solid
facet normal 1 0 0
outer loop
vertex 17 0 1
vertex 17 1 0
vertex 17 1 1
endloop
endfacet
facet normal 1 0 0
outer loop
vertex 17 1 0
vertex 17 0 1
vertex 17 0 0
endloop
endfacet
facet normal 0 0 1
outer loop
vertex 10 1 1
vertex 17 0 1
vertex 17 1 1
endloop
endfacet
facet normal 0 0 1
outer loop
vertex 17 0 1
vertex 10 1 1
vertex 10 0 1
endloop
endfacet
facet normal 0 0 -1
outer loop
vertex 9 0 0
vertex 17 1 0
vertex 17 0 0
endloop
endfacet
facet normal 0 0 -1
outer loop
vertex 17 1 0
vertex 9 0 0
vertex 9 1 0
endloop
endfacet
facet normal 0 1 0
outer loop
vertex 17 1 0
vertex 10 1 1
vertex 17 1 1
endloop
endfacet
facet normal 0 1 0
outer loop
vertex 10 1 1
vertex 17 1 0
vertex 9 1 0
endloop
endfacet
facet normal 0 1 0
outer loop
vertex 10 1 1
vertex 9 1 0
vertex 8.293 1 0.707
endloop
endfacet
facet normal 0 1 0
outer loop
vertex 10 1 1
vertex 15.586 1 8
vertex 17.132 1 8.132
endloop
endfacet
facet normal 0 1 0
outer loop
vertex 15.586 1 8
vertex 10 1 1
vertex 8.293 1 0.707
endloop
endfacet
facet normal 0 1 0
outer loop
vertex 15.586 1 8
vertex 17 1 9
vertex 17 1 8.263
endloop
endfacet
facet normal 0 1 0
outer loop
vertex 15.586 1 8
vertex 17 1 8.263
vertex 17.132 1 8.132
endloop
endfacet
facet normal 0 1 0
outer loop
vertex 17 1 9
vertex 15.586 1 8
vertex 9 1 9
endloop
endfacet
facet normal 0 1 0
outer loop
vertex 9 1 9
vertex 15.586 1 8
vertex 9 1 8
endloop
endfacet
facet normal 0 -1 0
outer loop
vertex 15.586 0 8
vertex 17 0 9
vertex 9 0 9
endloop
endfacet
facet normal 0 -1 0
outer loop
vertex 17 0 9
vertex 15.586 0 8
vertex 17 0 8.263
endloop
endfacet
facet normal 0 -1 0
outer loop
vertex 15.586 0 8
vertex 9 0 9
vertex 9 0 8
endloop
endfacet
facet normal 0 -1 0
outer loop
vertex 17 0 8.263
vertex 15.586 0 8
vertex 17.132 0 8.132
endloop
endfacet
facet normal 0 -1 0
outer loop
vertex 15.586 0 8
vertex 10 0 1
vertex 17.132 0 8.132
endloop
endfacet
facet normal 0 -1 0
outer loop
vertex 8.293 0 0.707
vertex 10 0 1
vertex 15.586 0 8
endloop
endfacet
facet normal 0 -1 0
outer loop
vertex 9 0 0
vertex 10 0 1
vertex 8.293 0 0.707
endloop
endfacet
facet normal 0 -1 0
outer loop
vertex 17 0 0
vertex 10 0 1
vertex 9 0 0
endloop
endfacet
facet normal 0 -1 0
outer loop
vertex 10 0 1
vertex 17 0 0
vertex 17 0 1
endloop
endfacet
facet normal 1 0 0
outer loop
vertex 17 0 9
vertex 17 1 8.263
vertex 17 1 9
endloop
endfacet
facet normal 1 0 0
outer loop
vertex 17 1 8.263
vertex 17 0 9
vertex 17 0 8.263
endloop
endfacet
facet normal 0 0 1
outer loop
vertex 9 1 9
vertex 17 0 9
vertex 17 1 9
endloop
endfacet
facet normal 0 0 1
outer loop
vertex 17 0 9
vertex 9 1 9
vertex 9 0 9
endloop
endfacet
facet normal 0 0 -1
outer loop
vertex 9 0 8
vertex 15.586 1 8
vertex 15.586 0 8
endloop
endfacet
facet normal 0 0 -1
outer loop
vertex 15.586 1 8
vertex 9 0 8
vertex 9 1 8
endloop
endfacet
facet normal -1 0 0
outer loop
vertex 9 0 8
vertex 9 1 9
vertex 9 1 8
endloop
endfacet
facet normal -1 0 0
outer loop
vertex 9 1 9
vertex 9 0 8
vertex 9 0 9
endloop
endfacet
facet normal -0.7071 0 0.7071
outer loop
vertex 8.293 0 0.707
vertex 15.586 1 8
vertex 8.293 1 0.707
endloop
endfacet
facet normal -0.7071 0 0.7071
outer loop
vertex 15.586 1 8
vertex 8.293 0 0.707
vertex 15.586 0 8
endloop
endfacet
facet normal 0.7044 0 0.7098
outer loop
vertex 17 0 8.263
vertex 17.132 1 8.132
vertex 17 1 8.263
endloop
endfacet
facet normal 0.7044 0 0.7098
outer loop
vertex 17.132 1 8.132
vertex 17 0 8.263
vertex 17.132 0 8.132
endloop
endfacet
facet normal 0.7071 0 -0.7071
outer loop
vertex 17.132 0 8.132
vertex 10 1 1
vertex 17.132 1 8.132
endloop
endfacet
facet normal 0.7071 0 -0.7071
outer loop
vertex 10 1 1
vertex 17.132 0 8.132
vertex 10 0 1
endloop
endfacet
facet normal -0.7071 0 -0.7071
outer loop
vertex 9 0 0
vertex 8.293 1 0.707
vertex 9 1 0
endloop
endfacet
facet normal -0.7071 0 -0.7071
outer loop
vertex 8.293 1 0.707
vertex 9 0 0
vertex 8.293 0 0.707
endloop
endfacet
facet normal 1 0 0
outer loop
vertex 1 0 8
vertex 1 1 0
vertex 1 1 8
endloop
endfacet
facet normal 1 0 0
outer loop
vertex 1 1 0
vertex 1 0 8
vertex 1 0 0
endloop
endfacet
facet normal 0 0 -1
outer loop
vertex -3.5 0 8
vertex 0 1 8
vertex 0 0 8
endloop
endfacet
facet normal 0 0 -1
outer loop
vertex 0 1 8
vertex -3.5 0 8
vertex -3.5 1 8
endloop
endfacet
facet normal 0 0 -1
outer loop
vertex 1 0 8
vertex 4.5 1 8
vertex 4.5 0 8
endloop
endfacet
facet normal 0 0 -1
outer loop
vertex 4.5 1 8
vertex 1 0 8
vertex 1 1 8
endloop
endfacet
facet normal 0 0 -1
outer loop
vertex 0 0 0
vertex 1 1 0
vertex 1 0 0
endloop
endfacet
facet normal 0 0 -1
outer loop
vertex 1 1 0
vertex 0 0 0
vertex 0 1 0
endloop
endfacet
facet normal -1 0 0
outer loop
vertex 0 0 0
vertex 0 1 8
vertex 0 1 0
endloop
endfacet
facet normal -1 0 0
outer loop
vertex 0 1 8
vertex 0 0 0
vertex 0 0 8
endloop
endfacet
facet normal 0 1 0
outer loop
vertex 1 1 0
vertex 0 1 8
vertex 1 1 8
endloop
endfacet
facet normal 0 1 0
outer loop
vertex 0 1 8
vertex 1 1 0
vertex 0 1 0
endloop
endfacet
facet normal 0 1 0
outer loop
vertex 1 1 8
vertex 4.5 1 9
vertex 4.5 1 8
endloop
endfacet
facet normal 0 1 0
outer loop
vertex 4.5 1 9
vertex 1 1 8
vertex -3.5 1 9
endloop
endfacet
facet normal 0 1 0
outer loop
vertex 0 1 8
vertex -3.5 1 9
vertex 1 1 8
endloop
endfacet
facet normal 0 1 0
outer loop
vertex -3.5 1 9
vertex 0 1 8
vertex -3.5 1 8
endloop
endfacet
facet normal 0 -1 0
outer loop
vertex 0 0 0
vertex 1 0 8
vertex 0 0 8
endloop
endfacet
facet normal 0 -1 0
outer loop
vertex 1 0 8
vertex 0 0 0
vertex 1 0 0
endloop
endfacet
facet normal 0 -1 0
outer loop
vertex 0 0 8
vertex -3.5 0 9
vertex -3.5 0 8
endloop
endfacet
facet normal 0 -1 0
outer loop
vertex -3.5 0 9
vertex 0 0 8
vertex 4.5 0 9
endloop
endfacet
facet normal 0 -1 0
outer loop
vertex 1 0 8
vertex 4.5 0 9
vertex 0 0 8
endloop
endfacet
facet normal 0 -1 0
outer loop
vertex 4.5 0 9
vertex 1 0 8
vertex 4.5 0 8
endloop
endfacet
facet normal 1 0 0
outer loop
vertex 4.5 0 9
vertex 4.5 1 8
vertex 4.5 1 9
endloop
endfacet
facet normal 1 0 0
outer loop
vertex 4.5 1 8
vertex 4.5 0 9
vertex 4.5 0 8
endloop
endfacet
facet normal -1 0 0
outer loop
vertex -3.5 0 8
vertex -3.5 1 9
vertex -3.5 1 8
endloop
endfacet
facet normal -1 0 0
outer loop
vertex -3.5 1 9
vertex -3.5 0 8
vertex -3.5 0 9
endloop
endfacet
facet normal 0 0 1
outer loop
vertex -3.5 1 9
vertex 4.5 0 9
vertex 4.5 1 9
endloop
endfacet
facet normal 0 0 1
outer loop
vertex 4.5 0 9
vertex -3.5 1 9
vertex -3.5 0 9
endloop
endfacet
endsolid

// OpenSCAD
cube([1, 1, 8]);
translate([-3.5, 0, 9]) rotate([0, 90, 0]) {
    cube([1, 1, 8]);
}


translate([9, 0, 0]) {
    cube([8, 1, 1]);
    translate([0, 0, 8]) {
        cube([8, 1, 1]);
    }
    rotate ([0, -45, 0]) {
        cube([11.5, 1, 1]);
    }
}
